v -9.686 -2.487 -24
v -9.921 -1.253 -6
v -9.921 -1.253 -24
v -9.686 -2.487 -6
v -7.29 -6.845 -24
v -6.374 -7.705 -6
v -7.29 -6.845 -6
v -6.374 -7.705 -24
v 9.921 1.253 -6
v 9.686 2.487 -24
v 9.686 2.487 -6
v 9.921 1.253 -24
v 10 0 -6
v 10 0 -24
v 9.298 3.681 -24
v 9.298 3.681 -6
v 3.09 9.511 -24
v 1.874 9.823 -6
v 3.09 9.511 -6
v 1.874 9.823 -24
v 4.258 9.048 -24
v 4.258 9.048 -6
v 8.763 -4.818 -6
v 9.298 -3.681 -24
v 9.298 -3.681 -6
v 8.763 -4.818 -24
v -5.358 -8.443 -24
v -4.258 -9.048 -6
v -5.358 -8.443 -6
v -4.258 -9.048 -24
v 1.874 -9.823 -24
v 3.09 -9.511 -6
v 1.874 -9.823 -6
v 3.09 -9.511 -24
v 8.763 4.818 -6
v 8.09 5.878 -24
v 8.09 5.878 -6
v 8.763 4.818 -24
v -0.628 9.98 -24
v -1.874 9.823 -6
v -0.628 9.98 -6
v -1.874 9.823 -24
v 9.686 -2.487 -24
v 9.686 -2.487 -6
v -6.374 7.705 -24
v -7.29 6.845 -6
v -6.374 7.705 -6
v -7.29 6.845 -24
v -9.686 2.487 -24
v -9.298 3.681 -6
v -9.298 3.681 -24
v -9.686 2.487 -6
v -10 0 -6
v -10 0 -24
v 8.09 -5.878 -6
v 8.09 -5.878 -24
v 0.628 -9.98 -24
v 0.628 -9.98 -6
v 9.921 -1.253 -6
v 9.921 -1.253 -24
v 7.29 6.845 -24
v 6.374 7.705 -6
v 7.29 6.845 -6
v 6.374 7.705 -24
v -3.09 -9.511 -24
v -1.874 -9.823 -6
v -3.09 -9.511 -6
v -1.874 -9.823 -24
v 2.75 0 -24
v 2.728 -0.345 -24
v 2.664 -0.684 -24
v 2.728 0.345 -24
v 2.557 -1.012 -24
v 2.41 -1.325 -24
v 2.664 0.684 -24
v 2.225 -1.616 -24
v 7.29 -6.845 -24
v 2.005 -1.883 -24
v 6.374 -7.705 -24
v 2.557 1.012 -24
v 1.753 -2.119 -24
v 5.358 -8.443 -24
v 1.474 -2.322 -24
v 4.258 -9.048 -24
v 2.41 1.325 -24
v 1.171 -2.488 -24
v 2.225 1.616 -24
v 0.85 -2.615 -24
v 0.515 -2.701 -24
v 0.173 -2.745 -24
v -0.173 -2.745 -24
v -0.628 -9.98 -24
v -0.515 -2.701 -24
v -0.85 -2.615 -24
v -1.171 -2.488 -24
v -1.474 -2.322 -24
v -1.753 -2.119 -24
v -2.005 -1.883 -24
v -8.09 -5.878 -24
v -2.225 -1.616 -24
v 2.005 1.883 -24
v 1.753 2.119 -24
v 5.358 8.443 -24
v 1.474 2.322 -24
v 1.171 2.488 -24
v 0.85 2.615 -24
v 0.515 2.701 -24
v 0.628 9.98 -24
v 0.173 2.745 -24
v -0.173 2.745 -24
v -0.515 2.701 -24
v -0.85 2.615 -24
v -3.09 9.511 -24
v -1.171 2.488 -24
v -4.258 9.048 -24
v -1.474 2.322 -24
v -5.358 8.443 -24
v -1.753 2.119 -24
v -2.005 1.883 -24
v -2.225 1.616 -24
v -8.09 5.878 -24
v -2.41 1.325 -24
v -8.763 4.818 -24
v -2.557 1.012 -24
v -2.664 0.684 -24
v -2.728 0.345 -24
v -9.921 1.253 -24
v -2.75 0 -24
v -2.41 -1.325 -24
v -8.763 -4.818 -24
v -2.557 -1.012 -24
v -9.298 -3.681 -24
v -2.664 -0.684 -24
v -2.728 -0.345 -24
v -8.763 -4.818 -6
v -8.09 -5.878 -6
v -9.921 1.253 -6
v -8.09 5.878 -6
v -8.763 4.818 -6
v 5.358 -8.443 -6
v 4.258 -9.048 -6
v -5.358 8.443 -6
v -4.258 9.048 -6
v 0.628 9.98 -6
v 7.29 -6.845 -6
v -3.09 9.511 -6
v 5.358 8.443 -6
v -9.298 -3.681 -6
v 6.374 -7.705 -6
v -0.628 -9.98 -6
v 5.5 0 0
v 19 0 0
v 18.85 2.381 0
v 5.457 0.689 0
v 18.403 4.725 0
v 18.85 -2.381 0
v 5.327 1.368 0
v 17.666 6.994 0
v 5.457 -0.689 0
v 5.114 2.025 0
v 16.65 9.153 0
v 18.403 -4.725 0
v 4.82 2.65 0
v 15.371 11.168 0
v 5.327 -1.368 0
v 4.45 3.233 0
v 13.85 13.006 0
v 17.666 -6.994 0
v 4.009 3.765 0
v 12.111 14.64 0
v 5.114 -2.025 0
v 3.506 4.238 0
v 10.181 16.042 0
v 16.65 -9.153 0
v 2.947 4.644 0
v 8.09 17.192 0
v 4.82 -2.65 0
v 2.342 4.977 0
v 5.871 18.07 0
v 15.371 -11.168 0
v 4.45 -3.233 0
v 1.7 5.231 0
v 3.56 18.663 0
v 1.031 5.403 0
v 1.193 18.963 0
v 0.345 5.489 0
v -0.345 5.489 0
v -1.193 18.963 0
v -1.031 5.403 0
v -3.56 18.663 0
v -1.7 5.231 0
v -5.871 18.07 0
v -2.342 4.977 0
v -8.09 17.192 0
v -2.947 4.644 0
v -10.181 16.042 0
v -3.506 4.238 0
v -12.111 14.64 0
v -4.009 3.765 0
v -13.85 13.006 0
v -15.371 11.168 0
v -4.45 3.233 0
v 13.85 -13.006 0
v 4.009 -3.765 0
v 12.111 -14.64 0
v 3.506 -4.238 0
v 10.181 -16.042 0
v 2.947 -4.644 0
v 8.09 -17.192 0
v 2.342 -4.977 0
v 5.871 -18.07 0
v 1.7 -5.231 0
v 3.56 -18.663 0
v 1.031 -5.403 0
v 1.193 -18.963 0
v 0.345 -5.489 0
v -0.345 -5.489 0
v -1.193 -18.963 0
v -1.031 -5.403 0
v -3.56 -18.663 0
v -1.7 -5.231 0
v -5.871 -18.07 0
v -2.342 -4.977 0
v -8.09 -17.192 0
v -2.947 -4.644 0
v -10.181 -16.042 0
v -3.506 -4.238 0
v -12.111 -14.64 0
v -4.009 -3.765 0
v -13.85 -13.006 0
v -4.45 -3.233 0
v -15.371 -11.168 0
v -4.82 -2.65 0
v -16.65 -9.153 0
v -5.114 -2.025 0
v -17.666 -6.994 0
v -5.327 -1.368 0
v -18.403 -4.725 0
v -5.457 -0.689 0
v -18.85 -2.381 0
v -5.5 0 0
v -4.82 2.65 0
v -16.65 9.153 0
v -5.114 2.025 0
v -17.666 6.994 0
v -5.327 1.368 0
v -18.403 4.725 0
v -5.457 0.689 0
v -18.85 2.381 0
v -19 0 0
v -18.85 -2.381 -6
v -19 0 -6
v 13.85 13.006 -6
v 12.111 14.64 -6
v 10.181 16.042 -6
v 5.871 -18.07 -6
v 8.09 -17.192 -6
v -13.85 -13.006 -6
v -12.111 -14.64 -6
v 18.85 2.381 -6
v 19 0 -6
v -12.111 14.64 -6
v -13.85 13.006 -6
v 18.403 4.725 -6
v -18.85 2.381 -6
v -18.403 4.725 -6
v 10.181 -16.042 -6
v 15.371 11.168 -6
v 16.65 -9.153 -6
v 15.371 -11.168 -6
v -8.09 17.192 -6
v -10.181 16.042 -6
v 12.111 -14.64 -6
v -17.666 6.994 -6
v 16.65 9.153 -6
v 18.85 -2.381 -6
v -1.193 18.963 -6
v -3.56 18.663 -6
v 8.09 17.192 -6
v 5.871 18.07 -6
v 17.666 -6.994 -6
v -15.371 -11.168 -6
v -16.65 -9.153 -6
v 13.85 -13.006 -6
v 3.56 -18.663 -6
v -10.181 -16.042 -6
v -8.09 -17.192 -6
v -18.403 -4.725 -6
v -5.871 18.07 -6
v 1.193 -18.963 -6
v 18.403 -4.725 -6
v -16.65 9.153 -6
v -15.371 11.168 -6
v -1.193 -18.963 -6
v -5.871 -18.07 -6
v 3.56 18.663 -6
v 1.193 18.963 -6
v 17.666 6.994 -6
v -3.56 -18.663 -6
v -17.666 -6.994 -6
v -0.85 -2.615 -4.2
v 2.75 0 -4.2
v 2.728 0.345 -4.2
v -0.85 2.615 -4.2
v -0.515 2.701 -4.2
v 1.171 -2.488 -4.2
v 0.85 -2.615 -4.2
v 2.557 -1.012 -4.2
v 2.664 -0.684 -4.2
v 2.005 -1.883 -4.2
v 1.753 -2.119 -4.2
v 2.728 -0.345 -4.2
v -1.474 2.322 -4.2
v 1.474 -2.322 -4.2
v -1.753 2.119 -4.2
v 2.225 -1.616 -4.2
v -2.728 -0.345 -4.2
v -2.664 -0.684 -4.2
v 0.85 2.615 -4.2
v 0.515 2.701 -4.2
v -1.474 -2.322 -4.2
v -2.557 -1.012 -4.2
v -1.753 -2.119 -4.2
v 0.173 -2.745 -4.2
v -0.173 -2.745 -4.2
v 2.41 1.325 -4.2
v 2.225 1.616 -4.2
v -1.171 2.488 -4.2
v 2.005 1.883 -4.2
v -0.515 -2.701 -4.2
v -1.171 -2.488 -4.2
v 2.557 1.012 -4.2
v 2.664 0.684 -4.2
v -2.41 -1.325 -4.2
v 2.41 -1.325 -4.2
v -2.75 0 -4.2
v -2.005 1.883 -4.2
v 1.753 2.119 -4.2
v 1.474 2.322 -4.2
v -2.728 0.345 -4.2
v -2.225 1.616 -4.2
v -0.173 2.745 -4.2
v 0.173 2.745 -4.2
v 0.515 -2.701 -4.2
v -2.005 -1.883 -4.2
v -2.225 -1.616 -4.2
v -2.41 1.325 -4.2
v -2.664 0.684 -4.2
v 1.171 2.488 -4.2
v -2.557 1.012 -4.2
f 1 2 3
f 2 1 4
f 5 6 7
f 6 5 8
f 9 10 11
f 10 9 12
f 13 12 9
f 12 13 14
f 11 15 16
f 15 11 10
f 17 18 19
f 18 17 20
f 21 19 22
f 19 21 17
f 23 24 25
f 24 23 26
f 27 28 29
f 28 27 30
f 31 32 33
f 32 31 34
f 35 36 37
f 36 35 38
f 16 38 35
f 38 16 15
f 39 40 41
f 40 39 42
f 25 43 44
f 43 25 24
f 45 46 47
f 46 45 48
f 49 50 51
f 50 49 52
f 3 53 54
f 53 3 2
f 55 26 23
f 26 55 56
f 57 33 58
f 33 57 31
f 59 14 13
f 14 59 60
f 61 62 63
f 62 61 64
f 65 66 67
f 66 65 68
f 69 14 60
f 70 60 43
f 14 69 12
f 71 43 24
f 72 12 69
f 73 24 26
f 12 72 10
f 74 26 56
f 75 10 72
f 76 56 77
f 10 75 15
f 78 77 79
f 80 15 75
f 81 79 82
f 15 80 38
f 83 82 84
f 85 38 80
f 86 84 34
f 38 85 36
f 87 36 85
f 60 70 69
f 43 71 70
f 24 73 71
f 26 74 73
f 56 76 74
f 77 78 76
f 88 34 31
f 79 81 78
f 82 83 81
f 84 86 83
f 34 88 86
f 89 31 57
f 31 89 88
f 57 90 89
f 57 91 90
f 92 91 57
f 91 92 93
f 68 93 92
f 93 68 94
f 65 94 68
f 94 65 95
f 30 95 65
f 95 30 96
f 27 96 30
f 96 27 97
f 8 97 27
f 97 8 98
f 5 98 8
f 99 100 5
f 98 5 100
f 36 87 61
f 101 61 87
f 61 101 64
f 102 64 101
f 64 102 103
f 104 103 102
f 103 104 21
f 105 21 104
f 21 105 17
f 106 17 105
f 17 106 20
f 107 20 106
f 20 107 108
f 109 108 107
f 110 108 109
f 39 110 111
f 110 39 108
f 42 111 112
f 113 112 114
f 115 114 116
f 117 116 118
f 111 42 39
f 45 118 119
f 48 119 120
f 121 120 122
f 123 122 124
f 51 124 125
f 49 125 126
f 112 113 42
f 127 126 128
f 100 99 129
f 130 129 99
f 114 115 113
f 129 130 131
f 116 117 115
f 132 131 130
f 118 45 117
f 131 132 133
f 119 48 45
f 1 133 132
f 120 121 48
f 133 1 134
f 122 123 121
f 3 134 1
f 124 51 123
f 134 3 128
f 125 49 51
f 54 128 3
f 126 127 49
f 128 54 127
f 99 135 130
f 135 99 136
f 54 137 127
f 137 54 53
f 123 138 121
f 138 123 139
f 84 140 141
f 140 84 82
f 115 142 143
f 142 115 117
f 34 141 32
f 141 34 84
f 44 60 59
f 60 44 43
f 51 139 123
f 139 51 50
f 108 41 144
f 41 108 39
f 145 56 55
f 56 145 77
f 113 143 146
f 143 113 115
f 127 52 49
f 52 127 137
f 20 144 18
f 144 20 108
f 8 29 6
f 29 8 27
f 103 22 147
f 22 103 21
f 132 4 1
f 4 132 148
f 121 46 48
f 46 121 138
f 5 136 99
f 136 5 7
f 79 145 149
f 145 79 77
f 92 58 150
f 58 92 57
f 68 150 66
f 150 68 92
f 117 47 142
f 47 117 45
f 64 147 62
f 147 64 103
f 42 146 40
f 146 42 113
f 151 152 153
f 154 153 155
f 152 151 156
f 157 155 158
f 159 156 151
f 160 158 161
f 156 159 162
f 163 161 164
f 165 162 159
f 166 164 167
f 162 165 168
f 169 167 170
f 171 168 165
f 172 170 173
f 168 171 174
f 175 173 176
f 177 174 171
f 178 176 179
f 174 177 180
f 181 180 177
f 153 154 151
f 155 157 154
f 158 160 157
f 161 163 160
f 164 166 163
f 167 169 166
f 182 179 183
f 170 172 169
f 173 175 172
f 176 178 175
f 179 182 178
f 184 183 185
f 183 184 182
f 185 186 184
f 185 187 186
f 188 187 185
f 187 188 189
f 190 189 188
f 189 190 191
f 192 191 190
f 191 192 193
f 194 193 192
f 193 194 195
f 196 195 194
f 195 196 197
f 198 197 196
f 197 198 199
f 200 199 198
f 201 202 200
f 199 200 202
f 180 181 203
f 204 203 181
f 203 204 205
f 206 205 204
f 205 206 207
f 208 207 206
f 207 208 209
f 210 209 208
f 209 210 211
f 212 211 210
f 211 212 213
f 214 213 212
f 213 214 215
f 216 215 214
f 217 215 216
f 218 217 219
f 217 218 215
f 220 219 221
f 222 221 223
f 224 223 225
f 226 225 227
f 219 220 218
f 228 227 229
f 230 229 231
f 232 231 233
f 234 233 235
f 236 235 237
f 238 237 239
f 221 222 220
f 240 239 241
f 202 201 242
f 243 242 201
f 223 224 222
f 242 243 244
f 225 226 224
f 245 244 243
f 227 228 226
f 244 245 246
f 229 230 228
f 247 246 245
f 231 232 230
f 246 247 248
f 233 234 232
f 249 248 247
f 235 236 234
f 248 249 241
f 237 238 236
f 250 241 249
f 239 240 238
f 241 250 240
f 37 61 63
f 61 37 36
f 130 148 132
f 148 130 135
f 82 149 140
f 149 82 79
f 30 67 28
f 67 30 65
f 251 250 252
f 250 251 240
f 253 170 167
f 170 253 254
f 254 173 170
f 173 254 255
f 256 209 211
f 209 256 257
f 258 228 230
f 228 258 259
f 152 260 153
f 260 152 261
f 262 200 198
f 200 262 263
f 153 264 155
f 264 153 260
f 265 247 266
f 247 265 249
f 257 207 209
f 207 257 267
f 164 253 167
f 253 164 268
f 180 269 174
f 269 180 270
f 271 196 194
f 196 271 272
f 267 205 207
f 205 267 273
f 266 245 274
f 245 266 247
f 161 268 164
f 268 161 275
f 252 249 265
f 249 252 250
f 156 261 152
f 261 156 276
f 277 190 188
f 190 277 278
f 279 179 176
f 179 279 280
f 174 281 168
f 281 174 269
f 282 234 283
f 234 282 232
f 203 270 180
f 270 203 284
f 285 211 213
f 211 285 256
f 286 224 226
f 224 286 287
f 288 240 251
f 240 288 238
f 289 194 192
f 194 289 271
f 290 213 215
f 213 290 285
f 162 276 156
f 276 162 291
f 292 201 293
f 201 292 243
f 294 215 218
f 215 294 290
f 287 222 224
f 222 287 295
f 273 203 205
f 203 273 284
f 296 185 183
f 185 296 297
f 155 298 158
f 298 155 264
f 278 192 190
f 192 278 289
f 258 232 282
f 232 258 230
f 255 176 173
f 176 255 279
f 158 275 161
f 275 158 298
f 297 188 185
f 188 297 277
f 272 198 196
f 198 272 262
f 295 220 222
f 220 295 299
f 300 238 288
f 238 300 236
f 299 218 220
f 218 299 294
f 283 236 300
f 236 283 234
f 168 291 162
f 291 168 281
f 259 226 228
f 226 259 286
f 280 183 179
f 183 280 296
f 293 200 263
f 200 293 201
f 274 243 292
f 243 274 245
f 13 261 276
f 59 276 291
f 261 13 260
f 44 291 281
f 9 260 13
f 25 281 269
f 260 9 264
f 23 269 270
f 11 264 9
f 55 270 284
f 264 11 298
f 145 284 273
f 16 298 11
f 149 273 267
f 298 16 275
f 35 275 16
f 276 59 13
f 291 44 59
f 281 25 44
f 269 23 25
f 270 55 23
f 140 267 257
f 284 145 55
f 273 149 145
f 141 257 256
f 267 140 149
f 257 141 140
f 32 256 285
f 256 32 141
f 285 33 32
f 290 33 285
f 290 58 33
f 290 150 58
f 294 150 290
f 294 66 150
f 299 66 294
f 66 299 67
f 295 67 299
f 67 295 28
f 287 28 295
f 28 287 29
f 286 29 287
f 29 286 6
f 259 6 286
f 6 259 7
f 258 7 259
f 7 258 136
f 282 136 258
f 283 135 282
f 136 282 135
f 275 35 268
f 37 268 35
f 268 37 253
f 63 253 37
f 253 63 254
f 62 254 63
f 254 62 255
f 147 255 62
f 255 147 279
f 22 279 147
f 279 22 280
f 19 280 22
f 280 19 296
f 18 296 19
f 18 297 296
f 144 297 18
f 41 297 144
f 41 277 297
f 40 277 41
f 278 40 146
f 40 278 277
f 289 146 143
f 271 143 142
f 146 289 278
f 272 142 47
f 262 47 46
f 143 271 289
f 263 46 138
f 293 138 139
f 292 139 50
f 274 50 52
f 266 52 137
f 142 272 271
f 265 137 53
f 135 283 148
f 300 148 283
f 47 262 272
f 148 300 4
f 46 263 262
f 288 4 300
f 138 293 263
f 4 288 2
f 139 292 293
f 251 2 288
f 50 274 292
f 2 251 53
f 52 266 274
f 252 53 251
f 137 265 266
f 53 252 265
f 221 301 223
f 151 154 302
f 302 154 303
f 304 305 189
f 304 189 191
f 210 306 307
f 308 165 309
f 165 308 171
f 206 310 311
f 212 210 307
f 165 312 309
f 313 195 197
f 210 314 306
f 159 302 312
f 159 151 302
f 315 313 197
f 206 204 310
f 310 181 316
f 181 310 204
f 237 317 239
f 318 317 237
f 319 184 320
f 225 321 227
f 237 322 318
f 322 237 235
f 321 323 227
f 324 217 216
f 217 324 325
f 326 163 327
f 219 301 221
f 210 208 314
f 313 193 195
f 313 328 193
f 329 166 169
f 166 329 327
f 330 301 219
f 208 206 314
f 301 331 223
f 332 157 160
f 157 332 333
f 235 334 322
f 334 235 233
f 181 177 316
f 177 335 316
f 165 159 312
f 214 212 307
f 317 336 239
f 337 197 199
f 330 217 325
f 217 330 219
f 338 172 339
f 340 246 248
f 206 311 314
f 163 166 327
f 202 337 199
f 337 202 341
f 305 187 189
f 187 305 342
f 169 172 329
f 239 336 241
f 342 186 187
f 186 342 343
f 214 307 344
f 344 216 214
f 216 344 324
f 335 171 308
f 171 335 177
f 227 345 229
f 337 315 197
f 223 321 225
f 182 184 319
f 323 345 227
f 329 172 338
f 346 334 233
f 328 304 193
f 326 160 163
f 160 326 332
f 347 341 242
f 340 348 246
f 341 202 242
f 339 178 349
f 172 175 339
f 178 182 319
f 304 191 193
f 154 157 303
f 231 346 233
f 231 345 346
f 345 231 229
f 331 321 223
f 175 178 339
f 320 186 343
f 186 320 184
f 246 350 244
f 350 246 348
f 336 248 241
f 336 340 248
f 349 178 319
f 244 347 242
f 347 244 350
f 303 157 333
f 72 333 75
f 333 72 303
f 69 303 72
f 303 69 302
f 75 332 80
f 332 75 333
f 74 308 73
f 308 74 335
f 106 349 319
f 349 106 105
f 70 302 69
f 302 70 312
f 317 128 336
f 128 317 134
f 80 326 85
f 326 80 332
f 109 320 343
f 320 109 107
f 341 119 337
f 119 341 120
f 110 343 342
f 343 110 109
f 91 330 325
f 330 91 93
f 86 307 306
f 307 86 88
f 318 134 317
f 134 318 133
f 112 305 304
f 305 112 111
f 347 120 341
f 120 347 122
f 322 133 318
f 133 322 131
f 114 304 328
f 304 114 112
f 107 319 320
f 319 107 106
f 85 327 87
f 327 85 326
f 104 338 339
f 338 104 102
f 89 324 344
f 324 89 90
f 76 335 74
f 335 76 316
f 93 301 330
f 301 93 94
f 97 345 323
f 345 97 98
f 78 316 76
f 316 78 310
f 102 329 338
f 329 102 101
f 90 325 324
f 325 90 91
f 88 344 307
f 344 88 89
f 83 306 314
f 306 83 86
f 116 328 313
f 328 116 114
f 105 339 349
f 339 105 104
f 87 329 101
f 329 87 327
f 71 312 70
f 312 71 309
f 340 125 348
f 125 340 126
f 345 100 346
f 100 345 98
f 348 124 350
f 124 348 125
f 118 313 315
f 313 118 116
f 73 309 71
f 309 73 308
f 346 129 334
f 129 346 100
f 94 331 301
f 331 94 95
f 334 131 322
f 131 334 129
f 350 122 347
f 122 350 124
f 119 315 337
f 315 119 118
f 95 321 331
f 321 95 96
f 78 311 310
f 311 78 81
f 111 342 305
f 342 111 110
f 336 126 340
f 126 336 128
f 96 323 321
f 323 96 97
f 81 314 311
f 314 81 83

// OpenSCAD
$fn = 50;


difference() {
	union() {
		translate(v = [0, 0, -24.0000000000]) {
			cylinder(h = 24, r = 10.0000000000);
		}
		translate(v = [0, 0, -6.0000000000]) {
			cylinder(h = 6, r = 19.0000000000);
		}
	}
	union() {
		translate(v = [0, 0, 0]) {
			rotate(a = [0, 0, 0]) {
				difference() {
					union() {
						#translate(v = [0, 0, -24.0000000000]) {
							cylinder(h = 24, r = 2.2500000000);
						}
						#translate(v = [0, 0, -4.2000000000]) {
							cylinder(h = 4.2000000000, r1 = 2.7500000000, r2 = 5.5000000000);
						}
						#translate(v = [0, 0, -24.0000000000]) {
							cylinder(h = 24, r = 2.7500000000);
						}
						#translate(v = [0, 0, -24.0000000000]) {
							cylinder(h = 24, r = 2.2500000000);
						}
					}
					union();
				}
			}
		}
	}
}
